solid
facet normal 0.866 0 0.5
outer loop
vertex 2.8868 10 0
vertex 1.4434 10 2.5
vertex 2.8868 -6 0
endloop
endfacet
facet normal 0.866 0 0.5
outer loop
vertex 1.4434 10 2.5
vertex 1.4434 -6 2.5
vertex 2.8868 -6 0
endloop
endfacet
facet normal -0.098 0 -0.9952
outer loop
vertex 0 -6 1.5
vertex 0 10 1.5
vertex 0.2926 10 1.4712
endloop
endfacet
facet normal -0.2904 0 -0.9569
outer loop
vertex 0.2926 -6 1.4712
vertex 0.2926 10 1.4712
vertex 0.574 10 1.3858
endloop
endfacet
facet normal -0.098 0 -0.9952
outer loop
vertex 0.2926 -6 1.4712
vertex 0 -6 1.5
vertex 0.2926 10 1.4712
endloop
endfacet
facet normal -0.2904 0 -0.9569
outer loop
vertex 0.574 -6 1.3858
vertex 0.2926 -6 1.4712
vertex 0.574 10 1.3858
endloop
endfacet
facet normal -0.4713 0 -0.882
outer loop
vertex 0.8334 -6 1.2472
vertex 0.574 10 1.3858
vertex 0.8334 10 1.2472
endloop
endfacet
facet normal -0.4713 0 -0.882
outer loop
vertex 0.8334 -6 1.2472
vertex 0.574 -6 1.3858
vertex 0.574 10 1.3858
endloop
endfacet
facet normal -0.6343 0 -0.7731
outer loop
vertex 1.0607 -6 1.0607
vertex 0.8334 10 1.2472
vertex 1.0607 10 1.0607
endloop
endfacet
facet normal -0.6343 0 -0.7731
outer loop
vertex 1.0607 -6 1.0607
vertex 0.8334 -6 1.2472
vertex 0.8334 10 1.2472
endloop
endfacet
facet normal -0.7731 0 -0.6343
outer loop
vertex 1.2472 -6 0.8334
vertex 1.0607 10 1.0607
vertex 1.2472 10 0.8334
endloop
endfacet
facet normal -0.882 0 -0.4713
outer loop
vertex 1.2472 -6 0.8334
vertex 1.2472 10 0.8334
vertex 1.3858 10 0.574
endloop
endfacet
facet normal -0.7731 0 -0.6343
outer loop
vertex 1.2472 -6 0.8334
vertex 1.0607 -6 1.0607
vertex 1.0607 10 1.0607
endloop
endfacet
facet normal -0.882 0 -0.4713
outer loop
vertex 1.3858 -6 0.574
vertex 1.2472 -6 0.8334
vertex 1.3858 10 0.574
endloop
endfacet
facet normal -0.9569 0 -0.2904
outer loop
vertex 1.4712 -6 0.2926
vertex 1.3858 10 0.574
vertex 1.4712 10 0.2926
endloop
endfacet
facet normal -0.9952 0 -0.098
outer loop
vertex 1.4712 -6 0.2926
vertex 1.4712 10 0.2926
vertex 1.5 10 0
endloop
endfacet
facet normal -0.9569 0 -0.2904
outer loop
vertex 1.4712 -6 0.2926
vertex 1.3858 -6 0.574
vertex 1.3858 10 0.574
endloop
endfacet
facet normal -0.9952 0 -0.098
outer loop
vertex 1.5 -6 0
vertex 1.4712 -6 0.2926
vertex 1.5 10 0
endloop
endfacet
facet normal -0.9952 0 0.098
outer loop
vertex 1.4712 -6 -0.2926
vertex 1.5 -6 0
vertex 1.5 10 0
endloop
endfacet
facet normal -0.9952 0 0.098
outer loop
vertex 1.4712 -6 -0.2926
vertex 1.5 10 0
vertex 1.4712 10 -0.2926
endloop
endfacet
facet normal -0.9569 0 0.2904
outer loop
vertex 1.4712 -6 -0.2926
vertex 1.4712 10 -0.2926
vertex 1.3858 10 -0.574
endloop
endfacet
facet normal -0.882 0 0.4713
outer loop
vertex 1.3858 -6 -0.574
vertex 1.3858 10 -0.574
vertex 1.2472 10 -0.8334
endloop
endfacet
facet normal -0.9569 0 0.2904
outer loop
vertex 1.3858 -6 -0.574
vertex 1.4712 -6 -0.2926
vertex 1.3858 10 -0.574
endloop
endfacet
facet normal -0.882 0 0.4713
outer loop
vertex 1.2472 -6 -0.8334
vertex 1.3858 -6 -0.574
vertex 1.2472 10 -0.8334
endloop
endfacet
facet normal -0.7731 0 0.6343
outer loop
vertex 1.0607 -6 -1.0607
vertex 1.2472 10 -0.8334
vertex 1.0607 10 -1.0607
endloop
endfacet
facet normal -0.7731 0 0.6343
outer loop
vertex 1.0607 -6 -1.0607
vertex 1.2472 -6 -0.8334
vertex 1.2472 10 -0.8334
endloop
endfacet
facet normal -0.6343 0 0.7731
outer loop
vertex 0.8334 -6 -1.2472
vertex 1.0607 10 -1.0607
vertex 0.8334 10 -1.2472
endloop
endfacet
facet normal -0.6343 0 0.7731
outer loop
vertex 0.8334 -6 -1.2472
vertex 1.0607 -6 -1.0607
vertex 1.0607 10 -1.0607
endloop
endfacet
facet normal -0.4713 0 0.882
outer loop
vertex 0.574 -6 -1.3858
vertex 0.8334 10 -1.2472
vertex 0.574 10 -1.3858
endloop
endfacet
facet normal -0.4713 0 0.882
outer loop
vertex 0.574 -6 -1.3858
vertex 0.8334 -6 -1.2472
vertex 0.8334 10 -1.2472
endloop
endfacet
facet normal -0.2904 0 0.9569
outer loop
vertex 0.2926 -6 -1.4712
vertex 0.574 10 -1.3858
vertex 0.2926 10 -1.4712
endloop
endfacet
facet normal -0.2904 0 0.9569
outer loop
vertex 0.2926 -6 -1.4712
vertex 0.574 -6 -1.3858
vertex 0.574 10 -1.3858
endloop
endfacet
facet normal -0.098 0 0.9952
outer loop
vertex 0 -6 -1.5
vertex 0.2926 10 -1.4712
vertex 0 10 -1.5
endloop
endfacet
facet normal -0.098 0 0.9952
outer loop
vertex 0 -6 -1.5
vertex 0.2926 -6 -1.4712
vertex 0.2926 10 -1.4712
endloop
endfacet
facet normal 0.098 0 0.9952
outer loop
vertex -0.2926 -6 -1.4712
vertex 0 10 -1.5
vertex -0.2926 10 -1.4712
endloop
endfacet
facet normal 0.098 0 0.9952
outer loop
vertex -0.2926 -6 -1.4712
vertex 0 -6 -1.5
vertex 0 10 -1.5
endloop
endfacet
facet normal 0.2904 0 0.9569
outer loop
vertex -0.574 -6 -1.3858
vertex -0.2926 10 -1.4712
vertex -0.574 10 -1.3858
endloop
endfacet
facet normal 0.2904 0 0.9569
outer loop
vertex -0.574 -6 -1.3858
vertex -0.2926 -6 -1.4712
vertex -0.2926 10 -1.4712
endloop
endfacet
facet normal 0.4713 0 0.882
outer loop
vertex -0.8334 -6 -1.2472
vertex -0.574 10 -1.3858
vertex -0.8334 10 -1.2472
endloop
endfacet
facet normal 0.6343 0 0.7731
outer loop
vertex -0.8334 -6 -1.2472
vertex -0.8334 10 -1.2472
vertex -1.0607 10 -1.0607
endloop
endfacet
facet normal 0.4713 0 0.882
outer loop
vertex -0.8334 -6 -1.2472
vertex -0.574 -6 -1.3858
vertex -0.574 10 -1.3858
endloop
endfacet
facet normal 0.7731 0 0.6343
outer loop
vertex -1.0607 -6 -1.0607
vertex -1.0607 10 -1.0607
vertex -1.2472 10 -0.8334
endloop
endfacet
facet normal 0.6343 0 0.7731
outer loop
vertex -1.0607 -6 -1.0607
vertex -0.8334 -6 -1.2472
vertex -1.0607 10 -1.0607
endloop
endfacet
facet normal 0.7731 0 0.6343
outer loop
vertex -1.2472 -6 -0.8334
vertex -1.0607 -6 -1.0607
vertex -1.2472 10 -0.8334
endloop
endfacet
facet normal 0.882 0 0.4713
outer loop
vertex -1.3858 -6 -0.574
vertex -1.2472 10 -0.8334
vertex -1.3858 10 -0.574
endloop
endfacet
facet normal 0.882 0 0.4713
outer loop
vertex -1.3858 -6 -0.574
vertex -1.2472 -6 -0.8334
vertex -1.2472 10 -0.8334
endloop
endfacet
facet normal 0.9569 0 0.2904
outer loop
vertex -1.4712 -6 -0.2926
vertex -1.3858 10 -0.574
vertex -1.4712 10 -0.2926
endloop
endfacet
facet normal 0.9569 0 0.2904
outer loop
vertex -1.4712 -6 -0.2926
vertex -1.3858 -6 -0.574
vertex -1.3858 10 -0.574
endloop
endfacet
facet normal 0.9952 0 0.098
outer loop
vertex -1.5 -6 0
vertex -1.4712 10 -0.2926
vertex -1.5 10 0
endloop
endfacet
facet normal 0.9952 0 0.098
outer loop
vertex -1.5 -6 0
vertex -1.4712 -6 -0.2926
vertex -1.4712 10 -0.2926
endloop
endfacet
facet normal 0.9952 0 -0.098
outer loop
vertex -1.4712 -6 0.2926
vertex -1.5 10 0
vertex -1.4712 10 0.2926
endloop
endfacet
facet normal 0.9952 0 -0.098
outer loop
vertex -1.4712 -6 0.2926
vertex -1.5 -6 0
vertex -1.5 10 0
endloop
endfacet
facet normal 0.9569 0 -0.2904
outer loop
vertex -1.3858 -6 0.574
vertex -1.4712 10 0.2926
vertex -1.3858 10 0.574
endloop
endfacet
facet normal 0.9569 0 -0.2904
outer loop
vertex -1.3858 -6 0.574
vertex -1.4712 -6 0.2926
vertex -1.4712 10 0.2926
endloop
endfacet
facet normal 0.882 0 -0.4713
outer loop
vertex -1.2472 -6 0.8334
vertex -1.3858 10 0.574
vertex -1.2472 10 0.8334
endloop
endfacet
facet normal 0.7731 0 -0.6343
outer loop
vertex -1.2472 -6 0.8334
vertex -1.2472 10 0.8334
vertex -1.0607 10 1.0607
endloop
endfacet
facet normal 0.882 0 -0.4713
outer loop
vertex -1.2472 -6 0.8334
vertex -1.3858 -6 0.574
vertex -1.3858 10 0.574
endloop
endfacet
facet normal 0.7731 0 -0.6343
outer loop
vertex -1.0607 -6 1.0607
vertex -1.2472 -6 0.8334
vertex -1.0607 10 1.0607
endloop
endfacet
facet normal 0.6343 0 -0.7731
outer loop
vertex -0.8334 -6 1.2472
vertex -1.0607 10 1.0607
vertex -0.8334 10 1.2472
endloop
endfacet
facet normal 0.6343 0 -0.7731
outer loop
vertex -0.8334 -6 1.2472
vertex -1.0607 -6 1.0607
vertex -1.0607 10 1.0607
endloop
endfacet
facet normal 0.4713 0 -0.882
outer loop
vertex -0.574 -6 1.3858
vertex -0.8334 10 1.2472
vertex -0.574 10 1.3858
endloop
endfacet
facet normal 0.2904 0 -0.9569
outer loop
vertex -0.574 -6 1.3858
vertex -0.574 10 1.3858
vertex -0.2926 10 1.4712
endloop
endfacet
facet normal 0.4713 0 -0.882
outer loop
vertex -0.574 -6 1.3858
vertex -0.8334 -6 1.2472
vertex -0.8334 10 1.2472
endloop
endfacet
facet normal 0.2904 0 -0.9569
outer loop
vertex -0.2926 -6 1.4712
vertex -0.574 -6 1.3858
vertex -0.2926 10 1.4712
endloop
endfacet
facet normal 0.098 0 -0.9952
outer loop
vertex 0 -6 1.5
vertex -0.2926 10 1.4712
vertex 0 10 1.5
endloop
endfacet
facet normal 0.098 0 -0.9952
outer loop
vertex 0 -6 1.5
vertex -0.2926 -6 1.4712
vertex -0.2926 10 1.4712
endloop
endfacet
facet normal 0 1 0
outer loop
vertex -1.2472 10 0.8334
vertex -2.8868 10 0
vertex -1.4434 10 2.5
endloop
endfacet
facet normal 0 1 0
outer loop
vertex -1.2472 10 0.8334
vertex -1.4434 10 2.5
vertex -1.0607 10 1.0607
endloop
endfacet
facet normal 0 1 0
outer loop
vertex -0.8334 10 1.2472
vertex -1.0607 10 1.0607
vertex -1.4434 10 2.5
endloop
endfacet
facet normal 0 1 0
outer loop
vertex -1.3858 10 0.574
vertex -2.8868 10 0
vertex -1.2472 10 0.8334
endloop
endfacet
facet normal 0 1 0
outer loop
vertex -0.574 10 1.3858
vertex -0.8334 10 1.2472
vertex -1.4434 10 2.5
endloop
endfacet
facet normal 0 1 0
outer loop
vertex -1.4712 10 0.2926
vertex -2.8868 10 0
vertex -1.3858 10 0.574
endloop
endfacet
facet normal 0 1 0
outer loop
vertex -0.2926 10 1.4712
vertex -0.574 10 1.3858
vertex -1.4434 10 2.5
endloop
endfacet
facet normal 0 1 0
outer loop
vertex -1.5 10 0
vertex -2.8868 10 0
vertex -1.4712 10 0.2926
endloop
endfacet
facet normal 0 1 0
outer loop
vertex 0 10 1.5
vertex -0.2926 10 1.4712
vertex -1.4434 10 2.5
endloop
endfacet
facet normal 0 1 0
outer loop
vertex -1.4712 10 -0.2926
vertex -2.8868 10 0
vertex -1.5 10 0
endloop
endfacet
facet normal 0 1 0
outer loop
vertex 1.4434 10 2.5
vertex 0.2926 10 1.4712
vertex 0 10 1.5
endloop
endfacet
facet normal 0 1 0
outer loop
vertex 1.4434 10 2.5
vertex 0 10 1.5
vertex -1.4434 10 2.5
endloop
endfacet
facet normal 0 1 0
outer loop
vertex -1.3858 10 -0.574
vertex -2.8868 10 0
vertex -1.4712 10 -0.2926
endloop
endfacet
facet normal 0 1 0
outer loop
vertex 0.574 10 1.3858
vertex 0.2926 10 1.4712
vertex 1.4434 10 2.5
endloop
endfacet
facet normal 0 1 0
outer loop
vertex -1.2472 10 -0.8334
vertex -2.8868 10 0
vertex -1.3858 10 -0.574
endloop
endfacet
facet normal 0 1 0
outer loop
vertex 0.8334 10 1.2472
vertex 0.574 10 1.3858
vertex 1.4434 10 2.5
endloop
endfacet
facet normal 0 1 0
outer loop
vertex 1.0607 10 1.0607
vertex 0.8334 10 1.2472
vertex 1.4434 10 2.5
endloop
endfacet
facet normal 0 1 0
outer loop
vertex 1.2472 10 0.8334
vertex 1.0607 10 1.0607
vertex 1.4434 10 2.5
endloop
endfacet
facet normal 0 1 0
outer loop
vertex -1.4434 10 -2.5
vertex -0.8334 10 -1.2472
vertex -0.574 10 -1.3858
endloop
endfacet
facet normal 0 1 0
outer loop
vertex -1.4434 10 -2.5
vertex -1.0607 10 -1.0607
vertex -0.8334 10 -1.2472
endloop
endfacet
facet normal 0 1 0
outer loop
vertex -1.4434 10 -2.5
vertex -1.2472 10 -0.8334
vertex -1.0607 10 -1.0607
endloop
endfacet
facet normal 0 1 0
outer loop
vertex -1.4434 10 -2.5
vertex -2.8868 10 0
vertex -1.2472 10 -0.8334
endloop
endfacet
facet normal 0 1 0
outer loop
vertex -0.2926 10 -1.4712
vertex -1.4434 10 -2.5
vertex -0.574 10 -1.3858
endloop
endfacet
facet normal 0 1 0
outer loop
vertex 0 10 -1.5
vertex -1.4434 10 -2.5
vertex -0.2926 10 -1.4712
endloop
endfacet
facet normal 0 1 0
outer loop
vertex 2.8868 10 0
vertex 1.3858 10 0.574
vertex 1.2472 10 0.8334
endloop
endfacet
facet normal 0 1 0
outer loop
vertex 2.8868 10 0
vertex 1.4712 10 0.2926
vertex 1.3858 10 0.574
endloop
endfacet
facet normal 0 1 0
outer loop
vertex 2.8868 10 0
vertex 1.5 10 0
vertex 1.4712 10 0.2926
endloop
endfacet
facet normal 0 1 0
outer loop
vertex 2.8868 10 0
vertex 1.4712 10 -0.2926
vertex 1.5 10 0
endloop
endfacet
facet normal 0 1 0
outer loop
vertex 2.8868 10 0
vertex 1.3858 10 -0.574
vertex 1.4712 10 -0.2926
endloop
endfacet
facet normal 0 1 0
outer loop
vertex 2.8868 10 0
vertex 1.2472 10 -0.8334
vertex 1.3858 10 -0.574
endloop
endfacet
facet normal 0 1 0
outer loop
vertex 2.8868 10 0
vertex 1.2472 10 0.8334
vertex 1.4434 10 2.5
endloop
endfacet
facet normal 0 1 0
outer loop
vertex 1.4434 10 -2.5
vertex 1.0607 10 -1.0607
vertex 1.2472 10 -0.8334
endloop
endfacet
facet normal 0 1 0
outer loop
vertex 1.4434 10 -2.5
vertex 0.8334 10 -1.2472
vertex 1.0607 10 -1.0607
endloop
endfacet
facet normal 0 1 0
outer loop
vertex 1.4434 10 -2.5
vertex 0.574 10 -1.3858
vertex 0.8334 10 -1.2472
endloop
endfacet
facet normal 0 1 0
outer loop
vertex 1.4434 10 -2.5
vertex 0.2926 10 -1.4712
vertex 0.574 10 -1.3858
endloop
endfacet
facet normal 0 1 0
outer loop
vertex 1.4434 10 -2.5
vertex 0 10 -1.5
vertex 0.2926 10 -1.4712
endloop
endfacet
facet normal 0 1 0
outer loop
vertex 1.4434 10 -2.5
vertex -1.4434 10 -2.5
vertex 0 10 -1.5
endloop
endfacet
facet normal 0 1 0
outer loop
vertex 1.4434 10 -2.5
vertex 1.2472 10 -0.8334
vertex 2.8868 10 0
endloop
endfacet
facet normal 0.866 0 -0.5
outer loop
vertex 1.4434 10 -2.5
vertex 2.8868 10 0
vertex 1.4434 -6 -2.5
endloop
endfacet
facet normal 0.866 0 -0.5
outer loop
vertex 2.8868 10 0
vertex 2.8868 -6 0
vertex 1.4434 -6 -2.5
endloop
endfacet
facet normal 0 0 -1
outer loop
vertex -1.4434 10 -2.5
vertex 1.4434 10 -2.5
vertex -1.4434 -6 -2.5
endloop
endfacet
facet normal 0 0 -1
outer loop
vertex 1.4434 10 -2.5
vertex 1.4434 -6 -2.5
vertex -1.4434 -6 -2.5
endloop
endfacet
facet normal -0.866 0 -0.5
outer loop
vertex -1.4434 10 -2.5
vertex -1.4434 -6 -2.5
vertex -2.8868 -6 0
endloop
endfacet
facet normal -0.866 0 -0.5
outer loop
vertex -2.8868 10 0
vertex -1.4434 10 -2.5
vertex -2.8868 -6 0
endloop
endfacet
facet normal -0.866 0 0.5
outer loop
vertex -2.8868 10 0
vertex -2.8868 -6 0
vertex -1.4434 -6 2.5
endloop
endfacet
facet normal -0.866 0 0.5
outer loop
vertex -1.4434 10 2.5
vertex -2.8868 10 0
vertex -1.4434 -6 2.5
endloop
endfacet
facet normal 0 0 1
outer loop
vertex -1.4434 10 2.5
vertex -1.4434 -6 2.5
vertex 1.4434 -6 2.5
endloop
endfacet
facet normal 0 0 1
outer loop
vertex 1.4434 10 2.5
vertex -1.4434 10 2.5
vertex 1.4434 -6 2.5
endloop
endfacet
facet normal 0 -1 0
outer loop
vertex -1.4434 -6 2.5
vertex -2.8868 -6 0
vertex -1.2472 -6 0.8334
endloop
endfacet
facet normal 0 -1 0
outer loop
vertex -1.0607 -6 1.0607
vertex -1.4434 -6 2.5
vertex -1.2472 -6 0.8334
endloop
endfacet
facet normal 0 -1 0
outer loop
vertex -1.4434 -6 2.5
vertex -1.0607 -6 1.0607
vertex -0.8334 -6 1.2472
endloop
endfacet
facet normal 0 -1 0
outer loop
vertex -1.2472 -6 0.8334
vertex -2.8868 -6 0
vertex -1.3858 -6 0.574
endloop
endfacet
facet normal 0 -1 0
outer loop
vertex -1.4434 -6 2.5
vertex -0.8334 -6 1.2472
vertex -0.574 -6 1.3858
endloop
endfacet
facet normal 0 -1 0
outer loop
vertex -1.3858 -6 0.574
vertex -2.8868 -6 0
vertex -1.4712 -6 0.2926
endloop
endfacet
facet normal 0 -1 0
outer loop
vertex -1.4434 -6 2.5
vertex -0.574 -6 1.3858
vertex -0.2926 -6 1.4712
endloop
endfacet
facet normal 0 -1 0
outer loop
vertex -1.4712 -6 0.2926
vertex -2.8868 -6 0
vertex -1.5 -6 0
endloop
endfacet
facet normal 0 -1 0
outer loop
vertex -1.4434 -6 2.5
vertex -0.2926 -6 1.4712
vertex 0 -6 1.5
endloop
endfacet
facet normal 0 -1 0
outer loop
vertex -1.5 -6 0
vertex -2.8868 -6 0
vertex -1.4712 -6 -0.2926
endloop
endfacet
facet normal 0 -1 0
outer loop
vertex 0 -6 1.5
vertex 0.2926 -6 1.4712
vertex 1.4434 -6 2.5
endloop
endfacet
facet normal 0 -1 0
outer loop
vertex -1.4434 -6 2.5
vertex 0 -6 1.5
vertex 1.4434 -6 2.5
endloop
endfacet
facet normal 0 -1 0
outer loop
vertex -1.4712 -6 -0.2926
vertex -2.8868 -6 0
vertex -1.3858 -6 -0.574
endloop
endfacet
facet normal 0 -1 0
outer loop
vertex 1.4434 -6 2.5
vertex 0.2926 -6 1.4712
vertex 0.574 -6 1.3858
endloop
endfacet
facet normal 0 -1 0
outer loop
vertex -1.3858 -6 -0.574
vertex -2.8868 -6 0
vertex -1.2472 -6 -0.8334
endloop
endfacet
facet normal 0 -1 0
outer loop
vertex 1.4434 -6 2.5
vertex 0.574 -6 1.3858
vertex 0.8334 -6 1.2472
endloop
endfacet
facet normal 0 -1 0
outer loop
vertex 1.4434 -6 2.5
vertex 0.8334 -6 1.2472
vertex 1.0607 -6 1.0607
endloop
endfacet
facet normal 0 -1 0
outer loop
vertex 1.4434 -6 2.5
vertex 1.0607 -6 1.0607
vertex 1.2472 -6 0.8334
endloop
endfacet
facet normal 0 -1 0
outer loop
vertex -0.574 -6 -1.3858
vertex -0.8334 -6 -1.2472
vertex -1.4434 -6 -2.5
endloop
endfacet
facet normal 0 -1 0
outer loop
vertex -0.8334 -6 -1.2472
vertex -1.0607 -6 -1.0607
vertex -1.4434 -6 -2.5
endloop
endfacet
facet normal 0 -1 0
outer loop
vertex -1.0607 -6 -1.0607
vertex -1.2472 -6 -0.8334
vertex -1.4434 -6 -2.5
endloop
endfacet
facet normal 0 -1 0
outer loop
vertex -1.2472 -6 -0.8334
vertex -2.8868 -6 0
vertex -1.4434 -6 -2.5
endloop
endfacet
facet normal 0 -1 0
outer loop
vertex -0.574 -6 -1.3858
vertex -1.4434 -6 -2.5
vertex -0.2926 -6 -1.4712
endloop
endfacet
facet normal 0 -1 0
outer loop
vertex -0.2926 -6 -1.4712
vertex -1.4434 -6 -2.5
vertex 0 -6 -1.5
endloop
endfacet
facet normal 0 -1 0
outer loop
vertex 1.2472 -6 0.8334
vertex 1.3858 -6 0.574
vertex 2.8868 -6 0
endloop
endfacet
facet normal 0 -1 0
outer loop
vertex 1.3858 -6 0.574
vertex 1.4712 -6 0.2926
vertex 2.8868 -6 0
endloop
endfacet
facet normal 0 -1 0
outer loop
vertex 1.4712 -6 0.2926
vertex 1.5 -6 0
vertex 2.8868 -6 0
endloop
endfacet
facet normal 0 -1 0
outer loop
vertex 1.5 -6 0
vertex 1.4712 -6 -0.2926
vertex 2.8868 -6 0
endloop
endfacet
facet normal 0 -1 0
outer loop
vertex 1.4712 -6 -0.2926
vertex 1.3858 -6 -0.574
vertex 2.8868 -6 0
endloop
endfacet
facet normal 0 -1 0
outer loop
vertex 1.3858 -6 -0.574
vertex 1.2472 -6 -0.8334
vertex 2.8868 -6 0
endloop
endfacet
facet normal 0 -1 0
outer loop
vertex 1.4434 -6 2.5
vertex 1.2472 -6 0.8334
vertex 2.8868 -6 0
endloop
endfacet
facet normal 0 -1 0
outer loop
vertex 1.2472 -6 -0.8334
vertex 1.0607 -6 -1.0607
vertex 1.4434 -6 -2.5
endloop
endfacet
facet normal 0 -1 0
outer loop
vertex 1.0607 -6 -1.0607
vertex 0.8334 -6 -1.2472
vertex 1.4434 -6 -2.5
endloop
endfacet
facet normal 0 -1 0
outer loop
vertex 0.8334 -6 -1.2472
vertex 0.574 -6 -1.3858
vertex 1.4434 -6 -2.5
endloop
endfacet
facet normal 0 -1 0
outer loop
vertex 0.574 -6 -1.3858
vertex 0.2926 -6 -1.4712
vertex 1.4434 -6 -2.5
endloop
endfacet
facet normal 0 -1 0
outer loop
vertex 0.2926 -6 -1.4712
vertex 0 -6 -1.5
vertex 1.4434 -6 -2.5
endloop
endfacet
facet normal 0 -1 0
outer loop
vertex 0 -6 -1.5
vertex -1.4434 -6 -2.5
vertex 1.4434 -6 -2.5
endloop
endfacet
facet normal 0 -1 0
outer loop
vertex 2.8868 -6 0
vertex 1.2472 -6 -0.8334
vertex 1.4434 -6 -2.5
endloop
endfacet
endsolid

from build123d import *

# Parameters (mm, degrees)
CROQUIS1_R              = 1.5
SALIENTE_EXTRUIR1_DEPTH = 6
SKETCH_1_R              = 1.5
EXTRUDE_1_DEPTH         = 4


with BuildPart() as part:
    # Croquis1 → Saliente-Extruir1 (new, symmetric)
    with BuildSketch(Plane(origin=(0, 0, 0), x_dir=(1, 0, 0), z_dir=(0, 1, 0))):
        Polygon((1.443375673, -2.5), (2.886751346, 0), (1.443375673, 2.5), (-1.443375673, 2.5), (-2.886751346, 0), (-1.443375673, -2.5), align=None)
        with Locations(Location((0, 0, 0), (0, 0, 270))):
            Circle(CROQUIS1_R, mode=Mode.SUBTRACT)
    extrude(amount=SALIENTE_EXTRUIR1_DEPTH, both=True)

    # 草图1 → 凸台-拉伸1 (add)
    with BuildSketch(Plane(origin=(0, 6, 0), x_dir=(1, 0, 0), z_dir=(0, 1, 0))):
        Polygon((-1.443375673, -2.5), (1.443375673, -2.5), (2.886751346, 0), (1.443375673, 2.5), (-1.443375673, 2.5), (-2.886751346, 0), align=None)
        with Locations(Location((0, 0, 0), (0, 0, 270))):
            Circle(SKETCH_1_R, mode=Mode.SUBTRACT)
    extrude(amount=EXTRUDE_1_DEPTH)


solid = part.part
